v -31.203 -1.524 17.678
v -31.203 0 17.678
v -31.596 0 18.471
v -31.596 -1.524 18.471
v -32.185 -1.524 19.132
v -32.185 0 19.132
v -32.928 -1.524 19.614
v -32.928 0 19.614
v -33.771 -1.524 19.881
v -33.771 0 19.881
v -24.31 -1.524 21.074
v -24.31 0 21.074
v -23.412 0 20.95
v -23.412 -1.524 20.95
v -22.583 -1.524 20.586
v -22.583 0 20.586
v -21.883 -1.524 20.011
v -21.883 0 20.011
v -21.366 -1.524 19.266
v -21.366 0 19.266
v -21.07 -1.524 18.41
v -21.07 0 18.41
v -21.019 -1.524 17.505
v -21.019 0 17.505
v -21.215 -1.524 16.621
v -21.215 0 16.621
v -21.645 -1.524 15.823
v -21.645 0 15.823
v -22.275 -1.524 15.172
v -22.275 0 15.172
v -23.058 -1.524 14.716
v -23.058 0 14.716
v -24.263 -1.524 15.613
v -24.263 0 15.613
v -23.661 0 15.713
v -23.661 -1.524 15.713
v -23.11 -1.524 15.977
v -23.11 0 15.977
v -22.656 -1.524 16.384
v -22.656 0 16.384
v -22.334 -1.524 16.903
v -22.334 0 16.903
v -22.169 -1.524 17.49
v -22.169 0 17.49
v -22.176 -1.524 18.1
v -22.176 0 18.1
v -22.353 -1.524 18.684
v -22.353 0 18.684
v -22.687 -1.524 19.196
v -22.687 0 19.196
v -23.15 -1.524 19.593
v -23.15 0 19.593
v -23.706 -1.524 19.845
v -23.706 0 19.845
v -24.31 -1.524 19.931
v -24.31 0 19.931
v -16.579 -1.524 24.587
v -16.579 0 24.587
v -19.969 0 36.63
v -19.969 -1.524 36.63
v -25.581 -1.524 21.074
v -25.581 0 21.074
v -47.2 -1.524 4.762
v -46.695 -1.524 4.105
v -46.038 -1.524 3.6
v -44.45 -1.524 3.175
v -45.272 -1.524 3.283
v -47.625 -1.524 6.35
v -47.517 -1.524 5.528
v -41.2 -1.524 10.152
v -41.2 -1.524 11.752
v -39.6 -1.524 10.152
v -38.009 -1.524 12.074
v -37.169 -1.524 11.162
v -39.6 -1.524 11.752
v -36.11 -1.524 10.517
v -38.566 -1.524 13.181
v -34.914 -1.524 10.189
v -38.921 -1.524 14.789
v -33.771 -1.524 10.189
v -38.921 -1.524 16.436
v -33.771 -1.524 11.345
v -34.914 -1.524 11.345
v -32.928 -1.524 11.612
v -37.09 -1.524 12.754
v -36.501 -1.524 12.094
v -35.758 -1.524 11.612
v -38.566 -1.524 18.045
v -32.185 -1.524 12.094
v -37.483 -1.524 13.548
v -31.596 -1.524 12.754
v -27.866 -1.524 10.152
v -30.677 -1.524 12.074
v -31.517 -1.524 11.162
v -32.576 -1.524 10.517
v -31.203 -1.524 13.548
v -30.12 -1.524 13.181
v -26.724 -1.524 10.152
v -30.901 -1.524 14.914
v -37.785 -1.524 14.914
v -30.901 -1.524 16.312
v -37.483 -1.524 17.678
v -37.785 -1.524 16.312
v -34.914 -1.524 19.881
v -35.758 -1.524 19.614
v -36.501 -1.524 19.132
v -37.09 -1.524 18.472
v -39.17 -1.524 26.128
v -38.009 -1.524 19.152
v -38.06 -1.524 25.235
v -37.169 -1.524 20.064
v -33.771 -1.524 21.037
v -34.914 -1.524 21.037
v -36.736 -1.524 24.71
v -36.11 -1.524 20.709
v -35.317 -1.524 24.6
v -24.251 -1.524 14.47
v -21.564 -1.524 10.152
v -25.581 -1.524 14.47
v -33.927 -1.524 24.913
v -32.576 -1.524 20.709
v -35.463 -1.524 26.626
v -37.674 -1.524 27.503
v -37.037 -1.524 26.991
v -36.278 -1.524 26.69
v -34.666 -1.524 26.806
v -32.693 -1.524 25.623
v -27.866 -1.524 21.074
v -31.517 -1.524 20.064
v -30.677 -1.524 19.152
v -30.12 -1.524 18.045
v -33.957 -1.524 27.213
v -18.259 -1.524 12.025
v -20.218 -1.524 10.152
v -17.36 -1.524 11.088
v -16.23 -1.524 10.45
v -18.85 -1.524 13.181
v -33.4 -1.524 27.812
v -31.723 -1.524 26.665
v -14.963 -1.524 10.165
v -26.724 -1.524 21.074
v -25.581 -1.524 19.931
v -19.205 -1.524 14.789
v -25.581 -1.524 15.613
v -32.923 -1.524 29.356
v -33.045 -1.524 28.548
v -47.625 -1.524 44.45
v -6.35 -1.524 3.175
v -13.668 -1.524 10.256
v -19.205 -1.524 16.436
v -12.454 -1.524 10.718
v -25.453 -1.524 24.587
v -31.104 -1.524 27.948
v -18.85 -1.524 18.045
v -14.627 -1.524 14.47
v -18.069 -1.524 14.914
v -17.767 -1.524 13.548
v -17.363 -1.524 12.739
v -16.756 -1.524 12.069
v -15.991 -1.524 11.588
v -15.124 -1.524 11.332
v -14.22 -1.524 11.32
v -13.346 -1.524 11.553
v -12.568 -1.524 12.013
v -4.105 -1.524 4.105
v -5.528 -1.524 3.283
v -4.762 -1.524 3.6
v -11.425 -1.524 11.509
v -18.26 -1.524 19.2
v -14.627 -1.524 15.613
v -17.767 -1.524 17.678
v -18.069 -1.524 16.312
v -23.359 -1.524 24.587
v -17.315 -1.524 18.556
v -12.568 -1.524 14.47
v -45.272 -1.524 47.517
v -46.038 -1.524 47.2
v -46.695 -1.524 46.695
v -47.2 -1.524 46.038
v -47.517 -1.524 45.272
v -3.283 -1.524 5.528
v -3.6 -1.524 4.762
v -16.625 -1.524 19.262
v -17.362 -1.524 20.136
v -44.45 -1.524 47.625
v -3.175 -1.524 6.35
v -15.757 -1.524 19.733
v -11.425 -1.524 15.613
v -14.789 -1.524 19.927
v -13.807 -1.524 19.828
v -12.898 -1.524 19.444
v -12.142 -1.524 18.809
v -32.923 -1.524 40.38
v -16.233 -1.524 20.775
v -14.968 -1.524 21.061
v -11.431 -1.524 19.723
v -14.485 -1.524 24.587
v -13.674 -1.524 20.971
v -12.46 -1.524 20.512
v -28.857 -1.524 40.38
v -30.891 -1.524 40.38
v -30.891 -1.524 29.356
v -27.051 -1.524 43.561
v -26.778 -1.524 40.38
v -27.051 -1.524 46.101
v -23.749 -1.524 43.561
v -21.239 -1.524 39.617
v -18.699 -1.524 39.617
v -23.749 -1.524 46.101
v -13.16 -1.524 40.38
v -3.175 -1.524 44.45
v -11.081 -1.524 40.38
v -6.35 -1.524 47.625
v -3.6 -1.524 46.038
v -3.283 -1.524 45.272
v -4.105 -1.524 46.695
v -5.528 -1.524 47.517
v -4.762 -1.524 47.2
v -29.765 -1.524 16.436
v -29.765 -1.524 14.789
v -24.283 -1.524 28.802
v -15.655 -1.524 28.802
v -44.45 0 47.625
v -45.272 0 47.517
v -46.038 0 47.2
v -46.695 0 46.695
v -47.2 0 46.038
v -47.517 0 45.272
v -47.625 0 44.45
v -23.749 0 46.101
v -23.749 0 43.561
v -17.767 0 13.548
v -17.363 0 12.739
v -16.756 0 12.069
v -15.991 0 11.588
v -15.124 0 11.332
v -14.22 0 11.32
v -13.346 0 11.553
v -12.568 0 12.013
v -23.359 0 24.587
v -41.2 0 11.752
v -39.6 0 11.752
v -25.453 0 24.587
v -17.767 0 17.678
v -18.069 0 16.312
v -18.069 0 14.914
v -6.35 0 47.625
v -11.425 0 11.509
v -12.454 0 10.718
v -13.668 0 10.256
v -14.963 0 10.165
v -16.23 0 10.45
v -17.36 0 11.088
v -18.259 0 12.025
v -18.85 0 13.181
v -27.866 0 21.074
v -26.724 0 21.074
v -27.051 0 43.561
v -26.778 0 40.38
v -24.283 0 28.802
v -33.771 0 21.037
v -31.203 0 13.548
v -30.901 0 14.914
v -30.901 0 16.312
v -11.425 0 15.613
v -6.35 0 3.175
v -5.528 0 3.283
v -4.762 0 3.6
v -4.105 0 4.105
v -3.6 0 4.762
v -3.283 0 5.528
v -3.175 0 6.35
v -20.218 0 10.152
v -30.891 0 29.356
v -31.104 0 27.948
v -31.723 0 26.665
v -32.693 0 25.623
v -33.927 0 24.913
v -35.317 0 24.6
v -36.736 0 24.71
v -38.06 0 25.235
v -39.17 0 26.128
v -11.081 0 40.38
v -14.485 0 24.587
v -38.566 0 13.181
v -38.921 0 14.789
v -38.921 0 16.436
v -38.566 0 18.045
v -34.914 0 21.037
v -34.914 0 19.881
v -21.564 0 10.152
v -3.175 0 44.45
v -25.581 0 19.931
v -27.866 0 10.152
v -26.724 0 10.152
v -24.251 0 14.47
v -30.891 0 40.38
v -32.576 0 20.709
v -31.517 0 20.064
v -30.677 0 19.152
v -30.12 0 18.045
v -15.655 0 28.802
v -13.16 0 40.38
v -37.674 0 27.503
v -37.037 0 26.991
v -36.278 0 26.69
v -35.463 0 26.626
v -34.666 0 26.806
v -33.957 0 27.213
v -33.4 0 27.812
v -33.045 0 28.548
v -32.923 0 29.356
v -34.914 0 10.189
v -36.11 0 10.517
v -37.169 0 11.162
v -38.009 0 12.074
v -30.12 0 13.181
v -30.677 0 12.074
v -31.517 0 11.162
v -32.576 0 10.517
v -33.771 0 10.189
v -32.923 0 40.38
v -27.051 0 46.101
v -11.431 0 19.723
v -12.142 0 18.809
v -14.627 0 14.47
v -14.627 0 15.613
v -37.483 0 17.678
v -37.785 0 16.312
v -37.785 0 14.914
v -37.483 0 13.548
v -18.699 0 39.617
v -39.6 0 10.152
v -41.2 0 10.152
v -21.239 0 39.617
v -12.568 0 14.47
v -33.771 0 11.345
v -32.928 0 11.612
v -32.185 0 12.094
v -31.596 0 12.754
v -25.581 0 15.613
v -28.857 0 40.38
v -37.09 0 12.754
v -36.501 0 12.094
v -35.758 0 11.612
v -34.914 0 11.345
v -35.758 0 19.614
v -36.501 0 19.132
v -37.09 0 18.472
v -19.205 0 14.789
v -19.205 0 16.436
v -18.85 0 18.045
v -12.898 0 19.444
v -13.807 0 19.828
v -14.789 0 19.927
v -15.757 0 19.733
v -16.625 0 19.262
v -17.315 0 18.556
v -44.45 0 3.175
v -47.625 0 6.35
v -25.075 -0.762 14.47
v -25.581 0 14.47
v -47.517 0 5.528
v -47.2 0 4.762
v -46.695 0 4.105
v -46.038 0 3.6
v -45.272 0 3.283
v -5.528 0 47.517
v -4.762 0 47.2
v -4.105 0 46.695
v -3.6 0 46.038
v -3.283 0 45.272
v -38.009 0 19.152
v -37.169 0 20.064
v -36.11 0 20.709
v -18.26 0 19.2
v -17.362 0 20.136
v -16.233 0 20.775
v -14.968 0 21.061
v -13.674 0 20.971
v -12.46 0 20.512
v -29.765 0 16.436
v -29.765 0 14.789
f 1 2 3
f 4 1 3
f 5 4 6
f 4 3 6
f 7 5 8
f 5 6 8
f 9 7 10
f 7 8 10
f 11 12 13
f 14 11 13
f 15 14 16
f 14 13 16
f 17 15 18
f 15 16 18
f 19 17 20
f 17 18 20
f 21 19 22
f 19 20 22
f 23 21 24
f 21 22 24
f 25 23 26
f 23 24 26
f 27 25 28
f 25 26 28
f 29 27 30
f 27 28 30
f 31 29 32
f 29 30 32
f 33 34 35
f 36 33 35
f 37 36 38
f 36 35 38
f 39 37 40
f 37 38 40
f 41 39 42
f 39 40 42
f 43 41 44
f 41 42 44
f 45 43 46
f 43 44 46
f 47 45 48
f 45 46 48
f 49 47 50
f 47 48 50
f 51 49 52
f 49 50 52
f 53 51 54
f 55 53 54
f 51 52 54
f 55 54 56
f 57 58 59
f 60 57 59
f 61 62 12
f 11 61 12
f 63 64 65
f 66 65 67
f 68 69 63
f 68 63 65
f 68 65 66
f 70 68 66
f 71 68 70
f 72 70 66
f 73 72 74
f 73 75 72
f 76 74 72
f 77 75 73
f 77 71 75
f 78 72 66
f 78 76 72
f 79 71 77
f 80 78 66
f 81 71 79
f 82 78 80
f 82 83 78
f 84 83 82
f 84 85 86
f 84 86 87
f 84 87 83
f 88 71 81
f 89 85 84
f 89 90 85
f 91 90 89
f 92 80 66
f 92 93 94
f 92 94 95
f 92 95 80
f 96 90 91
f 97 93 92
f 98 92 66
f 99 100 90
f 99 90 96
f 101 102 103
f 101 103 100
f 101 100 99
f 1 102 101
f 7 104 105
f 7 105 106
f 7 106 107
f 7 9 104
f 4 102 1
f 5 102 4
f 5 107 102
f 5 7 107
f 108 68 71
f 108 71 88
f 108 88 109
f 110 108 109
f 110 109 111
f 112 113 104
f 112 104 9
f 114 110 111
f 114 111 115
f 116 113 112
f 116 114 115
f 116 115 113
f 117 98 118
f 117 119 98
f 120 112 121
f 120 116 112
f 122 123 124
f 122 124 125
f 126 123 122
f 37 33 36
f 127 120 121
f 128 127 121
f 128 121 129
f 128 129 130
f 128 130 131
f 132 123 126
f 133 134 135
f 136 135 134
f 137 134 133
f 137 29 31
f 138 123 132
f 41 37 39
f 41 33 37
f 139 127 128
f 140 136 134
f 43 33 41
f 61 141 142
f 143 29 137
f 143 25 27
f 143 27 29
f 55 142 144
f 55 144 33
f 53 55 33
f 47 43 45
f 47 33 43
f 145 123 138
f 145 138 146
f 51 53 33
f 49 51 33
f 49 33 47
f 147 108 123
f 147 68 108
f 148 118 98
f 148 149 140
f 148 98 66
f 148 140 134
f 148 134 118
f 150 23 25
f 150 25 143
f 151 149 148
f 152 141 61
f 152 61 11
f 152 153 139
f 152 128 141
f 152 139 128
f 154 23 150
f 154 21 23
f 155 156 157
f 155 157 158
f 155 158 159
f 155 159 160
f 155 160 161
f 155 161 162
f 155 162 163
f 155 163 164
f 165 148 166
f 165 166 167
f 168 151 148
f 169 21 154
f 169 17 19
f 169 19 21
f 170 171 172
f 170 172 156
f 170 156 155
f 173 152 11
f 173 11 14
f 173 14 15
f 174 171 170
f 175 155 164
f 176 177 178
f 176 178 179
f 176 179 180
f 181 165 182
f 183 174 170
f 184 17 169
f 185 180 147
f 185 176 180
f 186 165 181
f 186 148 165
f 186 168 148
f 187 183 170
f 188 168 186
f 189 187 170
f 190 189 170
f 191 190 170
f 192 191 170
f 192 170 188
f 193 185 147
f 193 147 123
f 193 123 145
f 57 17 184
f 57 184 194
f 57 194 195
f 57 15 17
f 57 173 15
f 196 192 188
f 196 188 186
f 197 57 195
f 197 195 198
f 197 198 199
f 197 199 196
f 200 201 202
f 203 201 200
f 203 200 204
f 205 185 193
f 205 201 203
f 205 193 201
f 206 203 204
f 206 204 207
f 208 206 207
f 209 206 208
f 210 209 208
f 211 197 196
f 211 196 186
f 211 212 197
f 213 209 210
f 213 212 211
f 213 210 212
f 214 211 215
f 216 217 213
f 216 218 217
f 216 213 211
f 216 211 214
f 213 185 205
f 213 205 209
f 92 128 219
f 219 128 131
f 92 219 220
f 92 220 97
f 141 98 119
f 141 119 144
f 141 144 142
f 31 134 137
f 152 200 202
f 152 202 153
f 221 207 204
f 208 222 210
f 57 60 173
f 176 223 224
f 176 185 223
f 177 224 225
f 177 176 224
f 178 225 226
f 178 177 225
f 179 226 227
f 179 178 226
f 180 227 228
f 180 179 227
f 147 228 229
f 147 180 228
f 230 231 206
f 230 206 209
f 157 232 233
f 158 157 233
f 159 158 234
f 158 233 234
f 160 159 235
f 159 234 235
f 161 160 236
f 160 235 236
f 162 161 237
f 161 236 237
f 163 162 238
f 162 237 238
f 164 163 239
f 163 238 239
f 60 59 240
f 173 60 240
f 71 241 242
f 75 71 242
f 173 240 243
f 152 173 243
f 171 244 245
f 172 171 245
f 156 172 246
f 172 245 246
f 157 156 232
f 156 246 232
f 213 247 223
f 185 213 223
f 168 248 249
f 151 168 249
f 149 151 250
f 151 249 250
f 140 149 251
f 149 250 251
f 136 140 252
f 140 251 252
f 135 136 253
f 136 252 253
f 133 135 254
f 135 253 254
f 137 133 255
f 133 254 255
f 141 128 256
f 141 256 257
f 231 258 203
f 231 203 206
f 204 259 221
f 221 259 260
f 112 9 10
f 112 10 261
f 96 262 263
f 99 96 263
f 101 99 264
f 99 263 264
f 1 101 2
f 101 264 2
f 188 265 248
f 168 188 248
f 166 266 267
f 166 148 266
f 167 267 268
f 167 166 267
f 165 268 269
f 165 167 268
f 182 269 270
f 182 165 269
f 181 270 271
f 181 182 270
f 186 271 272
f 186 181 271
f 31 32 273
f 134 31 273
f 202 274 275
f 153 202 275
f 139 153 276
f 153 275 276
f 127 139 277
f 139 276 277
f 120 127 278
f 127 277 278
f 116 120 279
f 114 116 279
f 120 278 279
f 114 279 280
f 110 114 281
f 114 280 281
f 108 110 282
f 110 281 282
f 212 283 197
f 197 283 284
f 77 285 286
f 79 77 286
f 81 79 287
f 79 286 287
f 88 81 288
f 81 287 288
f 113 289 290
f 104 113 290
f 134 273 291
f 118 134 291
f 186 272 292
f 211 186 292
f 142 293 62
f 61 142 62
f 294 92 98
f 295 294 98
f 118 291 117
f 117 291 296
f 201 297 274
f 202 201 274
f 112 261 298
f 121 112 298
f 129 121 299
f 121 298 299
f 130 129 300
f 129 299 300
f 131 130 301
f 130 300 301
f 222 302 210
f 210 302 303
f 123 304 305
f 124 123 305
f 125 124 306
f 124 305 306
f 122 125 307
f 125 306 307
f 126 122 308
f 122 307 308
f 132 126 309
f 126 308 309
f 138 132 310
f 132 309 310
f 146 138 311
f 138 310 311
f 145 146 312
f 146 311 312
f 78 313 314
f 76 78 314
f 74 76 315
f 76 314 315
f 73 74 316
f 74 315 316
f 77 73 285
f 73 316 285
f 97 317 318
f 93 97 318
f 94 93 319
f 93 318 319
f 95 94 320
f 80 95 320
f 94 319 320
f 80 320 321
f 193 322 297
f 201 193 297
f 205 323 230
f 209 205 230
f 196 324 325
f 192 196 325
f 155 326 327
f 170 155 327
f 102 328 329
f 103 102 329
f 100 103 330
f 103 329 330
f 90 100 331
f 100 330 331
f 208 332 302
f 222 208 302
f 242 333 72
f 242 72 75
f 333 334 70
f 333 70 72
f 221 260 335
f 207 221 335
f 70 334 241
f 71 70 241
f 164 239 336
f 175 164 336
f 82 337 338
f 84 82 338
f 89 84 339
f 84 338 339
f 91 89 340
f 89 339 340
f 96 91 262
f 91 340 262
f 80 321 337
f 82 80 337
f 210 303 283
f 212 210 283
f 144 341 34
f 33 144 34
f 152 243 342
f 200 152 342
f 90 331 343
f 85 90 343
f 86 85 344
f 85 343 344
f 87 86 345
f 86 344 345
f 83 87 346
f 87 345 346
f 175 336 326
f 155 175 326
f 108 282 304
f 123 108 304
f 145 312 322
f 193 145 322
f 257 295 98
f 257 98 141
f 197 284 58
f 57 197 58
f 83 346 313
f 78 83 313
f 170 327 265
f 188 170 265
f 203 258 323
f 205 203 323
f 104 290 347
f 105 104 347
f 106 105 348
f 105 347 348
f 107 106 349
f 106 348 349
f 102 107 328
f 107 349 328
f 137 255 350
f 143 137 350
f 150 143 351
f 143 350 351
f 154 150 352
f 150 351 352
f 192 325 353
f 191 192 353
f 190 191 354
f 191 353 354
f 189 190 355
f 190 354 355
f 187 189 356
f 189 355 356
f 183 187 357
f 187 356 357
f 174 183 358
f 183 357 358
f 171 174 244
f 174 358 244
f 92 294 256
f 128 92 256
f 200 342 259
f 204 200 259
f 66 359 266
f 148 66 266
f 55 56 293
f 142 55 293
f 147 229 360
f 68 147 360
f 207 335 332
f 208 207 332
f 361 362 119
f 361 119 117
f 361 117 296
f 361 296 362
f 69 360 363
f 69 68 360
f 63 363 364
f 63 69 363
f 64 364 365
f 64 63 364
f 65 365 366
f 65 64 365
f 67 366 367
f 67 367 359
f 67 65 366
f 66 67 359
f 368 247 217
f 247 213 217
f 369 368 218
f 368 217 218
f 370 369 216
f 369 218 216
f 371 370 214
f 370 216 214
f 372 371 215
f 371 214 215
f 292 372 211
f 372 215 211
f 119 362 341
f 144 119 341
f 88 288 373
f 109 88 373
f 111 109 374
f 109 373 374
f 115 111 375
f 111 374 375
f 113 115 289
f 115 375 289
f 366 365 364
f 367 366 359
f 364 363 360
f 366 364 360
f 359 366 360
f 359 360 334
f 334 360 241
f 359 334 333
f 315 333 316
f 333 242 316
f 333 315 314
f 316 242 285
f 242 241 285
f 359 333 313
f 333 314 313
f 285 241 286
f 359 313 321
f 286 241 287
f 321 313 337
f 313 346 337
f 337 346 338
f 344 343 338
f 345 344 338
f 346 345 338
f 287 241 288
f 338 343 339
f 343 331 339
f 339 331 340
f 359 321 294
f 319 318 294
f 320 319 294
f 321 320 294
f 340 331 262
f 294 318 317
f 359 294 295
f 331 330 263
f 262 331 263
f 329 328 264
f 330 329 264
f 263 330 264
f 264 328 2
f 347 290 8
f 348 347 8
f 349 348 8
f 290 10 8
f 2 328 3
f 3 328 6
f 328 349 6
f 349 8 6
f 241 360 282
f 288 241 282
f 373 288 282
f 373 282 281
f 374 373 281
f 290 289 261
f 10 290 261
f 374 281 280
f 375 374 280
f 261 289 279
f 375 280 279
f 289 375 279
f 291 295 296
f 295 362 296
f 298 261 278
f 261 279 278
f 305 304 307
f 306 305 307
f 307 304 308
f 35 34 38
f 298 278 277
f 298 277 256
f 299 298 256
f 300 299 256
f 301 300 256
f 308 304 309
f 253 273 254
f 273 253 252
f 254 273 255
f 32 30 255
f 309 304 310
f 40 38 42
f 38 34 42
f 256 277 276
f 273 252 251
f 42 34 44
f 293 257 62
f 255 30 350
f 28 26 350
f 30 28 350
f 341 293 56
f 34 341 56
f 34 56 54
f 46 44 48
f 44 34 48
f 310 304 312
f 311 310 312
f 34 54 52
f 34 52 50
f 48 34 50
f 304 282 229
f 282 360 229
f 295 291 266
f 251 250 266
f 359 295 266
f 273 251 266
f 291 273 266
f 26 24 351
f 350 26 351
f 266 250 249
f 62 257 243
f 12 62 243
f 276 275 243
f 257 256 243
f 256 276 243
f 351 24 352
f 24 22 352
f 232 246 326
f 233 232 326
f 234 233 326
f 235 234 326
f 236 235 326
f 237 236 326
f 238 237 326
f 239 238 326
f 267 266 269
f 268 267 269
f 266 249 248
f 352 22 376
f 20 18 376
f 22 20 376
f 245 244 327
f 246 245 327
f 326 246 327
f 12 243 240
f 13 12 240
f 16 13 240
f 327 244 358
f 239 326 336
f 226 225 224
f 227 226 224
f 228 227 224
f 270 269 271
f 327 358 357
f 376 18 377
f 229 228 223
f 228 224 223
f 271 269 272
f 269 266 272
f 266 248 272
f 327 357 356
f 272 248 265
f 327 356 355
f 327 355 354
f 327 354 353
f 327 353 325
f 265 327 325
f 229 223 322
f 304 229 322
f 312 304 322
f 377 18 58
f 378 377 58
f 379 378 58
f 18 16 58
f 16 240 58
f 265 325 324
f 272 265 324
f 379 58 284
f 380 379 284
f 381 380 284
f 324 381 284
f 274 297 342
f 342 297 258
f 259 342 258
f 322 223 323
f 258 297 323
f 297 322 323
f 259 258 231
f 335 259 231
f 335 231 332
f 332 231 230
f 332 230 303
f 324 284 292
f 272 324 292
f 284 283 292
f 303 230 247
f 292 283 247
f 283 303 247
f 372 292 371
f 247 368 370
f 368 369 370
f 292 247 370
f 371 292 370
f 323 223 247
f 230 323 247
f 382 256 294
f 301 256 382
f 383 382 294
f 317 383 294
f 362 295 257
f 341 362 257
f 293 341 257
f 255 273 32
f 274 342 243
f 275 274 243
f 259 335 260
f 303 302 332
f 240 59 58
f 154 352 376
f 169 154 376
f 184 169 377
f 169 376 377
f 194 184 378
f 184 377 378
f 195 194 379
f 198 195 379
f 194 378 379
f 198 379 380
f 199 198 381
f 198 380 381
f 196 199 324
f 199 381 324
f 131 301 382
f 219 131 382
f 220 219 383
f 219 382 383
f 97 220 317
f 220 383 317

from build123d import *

# Parameters (mm, degrees)
F1_W     = 1.6002
F1_H     = 1.6002
F1_W_2   = 1.142379
F1_H_2   = 10.922
F1_W_3   = 3.302
F1_H_3   = 2.54
F2_DEPTH = 1.524
F3_R     = 3.175


with BuildPart() as f2:
    # F1 (on Front) → F2 (new body)
    with BuildSketch(Plane.XZ):
        with BuildLine():
            ThreePointArc((-13.103278, 47.625), (-7.439488, 43.360512), (-3.175, 37.696722))
            Line((-3.175, 37.696722), (-3.175, 47.625))
            Line((-3.175, 47.625), (-13.103278, 47.625))
        make_face()
        with BuildLine():
            ThreePointArc((-47.625, 13.103278), (-43.360512, 7.439488), (-37.696722, 3.175))
            Line((-37.696722, 3.175), (-13.103278, 3.175))
            ThreePointArc((-13.103278, 3.175), (-7.439488, 7.439488), (-3.175, 13.103278))
            Line((-3.175, 13.103278), (-3.175, 37.696722))
            ThreePointArc((-3.175, 37.696722), (-7.439488, 43.360512), (-13.103278, 47.625))
            Line((-13.103278, 47.625), (-37.696722, 47.625))
            ThreePointArc((-37.696722, 47.625), (-43.360512, 43.360512), (-47.625, 37.696722))
            Line((-47.625, 37.696722), (-47.625, 13.103278))
        make_face()
        with Locations((-40.399718, 10.952067)):
            Rectangle(F1_W, F1_H, mode=Mode.SUBTRACT)
        with BuildLine():
            ThreePointArc((-34.914493, 19.881328), (-36.500967, 19.132292), (-37.482908, 17.678419))
            ThreePointArc((-37.482908, 17.678419), (-37.822793, 15.612967), (-37.482908, 13.547515))
            ThreePointArc((-37.482908, 13.547515), (-36.500967, 12.093642), (-34.914493, 11.344606))
            Line((-34.914493, 11.344606), (-34.914493, 10.188754))
            ThreePointArc((-34.914493, 10.188754), (-37.168718, 11.162006), (-38.565638, 13.181256))
            ThreePointArc((-38.565638, 13.181256), (-38.965793, 15.612967), (-38.565638, 18.044678))
            ThreePointArc((-38.565638, 18.044678), (-37.168718, 20.063928), (-34.914493, 21.037181))
            Line((-34.914493, 21.037181), (-34.914493, 19.881328))
        make_face(mode=Mode.SUBTRACT)
        with BuildLine():
            ThreePointArc((-30.120348, 18.044678), (-29.720193, 15.612967), (-30.120348, 13.181256))
            ThreePointArc((-30.120348, 13.181256), (-31.517268, 11.162006), (-33.771493, 10.188754))
            Line((-33.771493, 10.188754), (-33.771493, 11.344606))
            ThreePointArc((-33.771493, 11.344606), (-32.185019, 12.093642), (-31.203077, 13.547515))
            ThreePointArc((-31.203077, 13.547515), (-30.863193, 15.612967), (-31.203077, 17.678419))
            ThreePointArc((-31.203077, 17.678419), (-32.185019, 19.132292), (-33.771493, 19.881328))
            Line((-33.771493, 19.881328), (-33.771493, 21.037181))
            ThreePointArc((-33.771493, 21.037181), (-31.517268, 20.063928), (-30.120348, 18.044678))
        make_face(mode=Mode.SUBTRACT)
        with Locations((-27.294804, 15.612967)):
            Rectangle(F1_W_2, F1_H_2, mode=Mode.SUBTRACT)
        with BuildLine():
            Line((-23.058243, 14.716427), (-20.218135, 10.151967))
            Line((-20.218135, 10.151967), (-21.564335, 10.151967))
            Line((-21.564335, 10.151967), (-24.251414, 14.470487))
            add(Edge.make_bspline(
                [(-25.580614, 14.470296), (-25.412167, 14.47032), (-24.9691, 14.470384), (-24.526034, 14.470447), (-24.251414, 14.470487)],
                knots=[1.142379, 1.142379, 1.142379, 1.142379, 1.647719, 2.471579, 2.471579, 2.471579, 2.471579], degree=3))
            Line((-25.580614, 14.470296), (-25.580614, 15.613296))
            Line((-25.580614, 15.613296), (-24.2627, 15.613485))
            ThreePointArc((-24.2627, 15.613485), (-22.151123, 17.795615), (-24.309993, 19.930967))
            Line((-24.309993, 19.930967), (-25.580614, 19.930967))
            Line((-25.580614, 19.930967), (-25.580614, 21.073967))
            Line((-25.580614, 21.073967), (-24.309993, 21.073967))
            ThreePointArc((-24.309993, 21.073967), (-21.070194, 18.409858), (-23.058243, 14.716427))
        make_face(mode=Mode.SUBTRACT)
        with BuildLine():
            ThreePointArc((-17.767223, 13.547515), (-15.565822, 11.430607), (-12.567683, 12.012518))
            Line((-12.567683, 12.012518), (-12.567683, 14.469967))
            Line((-12.567683, 14.469967), (-14.627307, 14.469967))
            Line((-14.627307, 14.469967), (-14.627307, 15.612967))
            Line((-14.627307, 15.612967), (-11.424683, 15.612967))
            Line((-11.424683, 15.612967), (-11.424683, 11.508976))
            ThreePointArc((-11.424683, 11.508976), (-15.606715, 10.260892), (-18.849952, 13.181256))
            ThreePointArc((-18.849952, 13.181256), (-19.250107, 15.612967), (-18.849952, 18.044678))
            ThreePointArc((-18.849952, 18.044678), (-15.610848, 20.96411), (-11.430582, 19.72304))
            Line((-11.430582, 19.72304), (-12.141509, 18.808992))
            ThreePointArc((-12.141509, 18.808992), (-15.280389, 19.865993), (-17.767223, 17.678419))
            ThreePointArc((-17.767223, 17.678419), (-18.107107, 15.612967), (-17.767223, 13.547515))
        make_face(mode=Mode.SUBTRACT)
        with BuildLine():
            Line((-30.890982, 40.37965), (-30.890982, 29.35605))
            ThreePointArc((-30.890982, 29.35605), (-33.927344, 24.913031), (-39.169881, 26.127817))
            Line((-39.169881, 26.127817), (-37.674255, 27.503363))
            ThreePointArc((-37.674255, 27.503363), (-34.665555, 26.806195), (-32.922982, 29.35605))
            Line((-32.922982, 29.35605), (-32.922982, 40.37965))
            Line((-32.922982, 40.37965), (-30.890982, 40.37965))
        make_face(mode=Mode.SUBTRACT)
        with Locations((-25.4, 44.831)):
            Rectangle(F1_W_3, F1_H_3, mode=Mode.SUBTRACT)
        Polygon((-28.856911, 40.37965), (-26.778254, 40.37965), (-24.283081, 28.802234), (-21.238982, 39.617483), (-18.698982, 39.617483), (-15.654884, 28.802234), (-13.159711, 40.37965), (-11.081054, 40.37965), (-14.484654, 24.5872), (-16.57946, 24.5872), (-19.968982, 36.629689), (-23.358505, 24.5872), (-25.453311, 24.5872), align=None, mode=Mode.SUBTRACT)
        with BuildLine():
            ThreePointArc((-3.175, 13.103278), (-7.439488, 7.439488), (-13.103278, 3.175))
            Line((-13.103278, 3.175), (-3.175, 3.175))
            Line((-3.175, 3.175), (-3.175, 13.103278))
        make_face()
        with BuildLine():
            Line((-47.625, 47.625), (-47.625, 37.696722))
            ThreePointArc((-47.625, 37.696722), (-43.360512, 43.360512), (-37.696722, 47.625))
            Line((-37.696722, 47.625), (-47.625, 47.625))
        make_face()
        with BuildLine():
            Line((-47.625, 3.175), (-37.696722, 3.175))
            ThreePointArc((-37.696722, 3.175), (-43.360512, 7.439488), (-47.625, 13.103278))
            Line((-47.625, 13.103278), (-47.625, 3.175))
        make_face()
    extrude(amount=F2_DEPTH)

    # F3
    f3_edges = [f2.edges().sort_by_distance(p)[0] for p in [
        (-47.625, -0.762, 47.625),
        (-3.175, -0.762, 47.625),
        (-3.175, -0.762, 3.175),
        (-47.625, -0.762, 3.175),
    ]]
    fillet(f3_edges, radius=F3_R)


solid = f2.part
